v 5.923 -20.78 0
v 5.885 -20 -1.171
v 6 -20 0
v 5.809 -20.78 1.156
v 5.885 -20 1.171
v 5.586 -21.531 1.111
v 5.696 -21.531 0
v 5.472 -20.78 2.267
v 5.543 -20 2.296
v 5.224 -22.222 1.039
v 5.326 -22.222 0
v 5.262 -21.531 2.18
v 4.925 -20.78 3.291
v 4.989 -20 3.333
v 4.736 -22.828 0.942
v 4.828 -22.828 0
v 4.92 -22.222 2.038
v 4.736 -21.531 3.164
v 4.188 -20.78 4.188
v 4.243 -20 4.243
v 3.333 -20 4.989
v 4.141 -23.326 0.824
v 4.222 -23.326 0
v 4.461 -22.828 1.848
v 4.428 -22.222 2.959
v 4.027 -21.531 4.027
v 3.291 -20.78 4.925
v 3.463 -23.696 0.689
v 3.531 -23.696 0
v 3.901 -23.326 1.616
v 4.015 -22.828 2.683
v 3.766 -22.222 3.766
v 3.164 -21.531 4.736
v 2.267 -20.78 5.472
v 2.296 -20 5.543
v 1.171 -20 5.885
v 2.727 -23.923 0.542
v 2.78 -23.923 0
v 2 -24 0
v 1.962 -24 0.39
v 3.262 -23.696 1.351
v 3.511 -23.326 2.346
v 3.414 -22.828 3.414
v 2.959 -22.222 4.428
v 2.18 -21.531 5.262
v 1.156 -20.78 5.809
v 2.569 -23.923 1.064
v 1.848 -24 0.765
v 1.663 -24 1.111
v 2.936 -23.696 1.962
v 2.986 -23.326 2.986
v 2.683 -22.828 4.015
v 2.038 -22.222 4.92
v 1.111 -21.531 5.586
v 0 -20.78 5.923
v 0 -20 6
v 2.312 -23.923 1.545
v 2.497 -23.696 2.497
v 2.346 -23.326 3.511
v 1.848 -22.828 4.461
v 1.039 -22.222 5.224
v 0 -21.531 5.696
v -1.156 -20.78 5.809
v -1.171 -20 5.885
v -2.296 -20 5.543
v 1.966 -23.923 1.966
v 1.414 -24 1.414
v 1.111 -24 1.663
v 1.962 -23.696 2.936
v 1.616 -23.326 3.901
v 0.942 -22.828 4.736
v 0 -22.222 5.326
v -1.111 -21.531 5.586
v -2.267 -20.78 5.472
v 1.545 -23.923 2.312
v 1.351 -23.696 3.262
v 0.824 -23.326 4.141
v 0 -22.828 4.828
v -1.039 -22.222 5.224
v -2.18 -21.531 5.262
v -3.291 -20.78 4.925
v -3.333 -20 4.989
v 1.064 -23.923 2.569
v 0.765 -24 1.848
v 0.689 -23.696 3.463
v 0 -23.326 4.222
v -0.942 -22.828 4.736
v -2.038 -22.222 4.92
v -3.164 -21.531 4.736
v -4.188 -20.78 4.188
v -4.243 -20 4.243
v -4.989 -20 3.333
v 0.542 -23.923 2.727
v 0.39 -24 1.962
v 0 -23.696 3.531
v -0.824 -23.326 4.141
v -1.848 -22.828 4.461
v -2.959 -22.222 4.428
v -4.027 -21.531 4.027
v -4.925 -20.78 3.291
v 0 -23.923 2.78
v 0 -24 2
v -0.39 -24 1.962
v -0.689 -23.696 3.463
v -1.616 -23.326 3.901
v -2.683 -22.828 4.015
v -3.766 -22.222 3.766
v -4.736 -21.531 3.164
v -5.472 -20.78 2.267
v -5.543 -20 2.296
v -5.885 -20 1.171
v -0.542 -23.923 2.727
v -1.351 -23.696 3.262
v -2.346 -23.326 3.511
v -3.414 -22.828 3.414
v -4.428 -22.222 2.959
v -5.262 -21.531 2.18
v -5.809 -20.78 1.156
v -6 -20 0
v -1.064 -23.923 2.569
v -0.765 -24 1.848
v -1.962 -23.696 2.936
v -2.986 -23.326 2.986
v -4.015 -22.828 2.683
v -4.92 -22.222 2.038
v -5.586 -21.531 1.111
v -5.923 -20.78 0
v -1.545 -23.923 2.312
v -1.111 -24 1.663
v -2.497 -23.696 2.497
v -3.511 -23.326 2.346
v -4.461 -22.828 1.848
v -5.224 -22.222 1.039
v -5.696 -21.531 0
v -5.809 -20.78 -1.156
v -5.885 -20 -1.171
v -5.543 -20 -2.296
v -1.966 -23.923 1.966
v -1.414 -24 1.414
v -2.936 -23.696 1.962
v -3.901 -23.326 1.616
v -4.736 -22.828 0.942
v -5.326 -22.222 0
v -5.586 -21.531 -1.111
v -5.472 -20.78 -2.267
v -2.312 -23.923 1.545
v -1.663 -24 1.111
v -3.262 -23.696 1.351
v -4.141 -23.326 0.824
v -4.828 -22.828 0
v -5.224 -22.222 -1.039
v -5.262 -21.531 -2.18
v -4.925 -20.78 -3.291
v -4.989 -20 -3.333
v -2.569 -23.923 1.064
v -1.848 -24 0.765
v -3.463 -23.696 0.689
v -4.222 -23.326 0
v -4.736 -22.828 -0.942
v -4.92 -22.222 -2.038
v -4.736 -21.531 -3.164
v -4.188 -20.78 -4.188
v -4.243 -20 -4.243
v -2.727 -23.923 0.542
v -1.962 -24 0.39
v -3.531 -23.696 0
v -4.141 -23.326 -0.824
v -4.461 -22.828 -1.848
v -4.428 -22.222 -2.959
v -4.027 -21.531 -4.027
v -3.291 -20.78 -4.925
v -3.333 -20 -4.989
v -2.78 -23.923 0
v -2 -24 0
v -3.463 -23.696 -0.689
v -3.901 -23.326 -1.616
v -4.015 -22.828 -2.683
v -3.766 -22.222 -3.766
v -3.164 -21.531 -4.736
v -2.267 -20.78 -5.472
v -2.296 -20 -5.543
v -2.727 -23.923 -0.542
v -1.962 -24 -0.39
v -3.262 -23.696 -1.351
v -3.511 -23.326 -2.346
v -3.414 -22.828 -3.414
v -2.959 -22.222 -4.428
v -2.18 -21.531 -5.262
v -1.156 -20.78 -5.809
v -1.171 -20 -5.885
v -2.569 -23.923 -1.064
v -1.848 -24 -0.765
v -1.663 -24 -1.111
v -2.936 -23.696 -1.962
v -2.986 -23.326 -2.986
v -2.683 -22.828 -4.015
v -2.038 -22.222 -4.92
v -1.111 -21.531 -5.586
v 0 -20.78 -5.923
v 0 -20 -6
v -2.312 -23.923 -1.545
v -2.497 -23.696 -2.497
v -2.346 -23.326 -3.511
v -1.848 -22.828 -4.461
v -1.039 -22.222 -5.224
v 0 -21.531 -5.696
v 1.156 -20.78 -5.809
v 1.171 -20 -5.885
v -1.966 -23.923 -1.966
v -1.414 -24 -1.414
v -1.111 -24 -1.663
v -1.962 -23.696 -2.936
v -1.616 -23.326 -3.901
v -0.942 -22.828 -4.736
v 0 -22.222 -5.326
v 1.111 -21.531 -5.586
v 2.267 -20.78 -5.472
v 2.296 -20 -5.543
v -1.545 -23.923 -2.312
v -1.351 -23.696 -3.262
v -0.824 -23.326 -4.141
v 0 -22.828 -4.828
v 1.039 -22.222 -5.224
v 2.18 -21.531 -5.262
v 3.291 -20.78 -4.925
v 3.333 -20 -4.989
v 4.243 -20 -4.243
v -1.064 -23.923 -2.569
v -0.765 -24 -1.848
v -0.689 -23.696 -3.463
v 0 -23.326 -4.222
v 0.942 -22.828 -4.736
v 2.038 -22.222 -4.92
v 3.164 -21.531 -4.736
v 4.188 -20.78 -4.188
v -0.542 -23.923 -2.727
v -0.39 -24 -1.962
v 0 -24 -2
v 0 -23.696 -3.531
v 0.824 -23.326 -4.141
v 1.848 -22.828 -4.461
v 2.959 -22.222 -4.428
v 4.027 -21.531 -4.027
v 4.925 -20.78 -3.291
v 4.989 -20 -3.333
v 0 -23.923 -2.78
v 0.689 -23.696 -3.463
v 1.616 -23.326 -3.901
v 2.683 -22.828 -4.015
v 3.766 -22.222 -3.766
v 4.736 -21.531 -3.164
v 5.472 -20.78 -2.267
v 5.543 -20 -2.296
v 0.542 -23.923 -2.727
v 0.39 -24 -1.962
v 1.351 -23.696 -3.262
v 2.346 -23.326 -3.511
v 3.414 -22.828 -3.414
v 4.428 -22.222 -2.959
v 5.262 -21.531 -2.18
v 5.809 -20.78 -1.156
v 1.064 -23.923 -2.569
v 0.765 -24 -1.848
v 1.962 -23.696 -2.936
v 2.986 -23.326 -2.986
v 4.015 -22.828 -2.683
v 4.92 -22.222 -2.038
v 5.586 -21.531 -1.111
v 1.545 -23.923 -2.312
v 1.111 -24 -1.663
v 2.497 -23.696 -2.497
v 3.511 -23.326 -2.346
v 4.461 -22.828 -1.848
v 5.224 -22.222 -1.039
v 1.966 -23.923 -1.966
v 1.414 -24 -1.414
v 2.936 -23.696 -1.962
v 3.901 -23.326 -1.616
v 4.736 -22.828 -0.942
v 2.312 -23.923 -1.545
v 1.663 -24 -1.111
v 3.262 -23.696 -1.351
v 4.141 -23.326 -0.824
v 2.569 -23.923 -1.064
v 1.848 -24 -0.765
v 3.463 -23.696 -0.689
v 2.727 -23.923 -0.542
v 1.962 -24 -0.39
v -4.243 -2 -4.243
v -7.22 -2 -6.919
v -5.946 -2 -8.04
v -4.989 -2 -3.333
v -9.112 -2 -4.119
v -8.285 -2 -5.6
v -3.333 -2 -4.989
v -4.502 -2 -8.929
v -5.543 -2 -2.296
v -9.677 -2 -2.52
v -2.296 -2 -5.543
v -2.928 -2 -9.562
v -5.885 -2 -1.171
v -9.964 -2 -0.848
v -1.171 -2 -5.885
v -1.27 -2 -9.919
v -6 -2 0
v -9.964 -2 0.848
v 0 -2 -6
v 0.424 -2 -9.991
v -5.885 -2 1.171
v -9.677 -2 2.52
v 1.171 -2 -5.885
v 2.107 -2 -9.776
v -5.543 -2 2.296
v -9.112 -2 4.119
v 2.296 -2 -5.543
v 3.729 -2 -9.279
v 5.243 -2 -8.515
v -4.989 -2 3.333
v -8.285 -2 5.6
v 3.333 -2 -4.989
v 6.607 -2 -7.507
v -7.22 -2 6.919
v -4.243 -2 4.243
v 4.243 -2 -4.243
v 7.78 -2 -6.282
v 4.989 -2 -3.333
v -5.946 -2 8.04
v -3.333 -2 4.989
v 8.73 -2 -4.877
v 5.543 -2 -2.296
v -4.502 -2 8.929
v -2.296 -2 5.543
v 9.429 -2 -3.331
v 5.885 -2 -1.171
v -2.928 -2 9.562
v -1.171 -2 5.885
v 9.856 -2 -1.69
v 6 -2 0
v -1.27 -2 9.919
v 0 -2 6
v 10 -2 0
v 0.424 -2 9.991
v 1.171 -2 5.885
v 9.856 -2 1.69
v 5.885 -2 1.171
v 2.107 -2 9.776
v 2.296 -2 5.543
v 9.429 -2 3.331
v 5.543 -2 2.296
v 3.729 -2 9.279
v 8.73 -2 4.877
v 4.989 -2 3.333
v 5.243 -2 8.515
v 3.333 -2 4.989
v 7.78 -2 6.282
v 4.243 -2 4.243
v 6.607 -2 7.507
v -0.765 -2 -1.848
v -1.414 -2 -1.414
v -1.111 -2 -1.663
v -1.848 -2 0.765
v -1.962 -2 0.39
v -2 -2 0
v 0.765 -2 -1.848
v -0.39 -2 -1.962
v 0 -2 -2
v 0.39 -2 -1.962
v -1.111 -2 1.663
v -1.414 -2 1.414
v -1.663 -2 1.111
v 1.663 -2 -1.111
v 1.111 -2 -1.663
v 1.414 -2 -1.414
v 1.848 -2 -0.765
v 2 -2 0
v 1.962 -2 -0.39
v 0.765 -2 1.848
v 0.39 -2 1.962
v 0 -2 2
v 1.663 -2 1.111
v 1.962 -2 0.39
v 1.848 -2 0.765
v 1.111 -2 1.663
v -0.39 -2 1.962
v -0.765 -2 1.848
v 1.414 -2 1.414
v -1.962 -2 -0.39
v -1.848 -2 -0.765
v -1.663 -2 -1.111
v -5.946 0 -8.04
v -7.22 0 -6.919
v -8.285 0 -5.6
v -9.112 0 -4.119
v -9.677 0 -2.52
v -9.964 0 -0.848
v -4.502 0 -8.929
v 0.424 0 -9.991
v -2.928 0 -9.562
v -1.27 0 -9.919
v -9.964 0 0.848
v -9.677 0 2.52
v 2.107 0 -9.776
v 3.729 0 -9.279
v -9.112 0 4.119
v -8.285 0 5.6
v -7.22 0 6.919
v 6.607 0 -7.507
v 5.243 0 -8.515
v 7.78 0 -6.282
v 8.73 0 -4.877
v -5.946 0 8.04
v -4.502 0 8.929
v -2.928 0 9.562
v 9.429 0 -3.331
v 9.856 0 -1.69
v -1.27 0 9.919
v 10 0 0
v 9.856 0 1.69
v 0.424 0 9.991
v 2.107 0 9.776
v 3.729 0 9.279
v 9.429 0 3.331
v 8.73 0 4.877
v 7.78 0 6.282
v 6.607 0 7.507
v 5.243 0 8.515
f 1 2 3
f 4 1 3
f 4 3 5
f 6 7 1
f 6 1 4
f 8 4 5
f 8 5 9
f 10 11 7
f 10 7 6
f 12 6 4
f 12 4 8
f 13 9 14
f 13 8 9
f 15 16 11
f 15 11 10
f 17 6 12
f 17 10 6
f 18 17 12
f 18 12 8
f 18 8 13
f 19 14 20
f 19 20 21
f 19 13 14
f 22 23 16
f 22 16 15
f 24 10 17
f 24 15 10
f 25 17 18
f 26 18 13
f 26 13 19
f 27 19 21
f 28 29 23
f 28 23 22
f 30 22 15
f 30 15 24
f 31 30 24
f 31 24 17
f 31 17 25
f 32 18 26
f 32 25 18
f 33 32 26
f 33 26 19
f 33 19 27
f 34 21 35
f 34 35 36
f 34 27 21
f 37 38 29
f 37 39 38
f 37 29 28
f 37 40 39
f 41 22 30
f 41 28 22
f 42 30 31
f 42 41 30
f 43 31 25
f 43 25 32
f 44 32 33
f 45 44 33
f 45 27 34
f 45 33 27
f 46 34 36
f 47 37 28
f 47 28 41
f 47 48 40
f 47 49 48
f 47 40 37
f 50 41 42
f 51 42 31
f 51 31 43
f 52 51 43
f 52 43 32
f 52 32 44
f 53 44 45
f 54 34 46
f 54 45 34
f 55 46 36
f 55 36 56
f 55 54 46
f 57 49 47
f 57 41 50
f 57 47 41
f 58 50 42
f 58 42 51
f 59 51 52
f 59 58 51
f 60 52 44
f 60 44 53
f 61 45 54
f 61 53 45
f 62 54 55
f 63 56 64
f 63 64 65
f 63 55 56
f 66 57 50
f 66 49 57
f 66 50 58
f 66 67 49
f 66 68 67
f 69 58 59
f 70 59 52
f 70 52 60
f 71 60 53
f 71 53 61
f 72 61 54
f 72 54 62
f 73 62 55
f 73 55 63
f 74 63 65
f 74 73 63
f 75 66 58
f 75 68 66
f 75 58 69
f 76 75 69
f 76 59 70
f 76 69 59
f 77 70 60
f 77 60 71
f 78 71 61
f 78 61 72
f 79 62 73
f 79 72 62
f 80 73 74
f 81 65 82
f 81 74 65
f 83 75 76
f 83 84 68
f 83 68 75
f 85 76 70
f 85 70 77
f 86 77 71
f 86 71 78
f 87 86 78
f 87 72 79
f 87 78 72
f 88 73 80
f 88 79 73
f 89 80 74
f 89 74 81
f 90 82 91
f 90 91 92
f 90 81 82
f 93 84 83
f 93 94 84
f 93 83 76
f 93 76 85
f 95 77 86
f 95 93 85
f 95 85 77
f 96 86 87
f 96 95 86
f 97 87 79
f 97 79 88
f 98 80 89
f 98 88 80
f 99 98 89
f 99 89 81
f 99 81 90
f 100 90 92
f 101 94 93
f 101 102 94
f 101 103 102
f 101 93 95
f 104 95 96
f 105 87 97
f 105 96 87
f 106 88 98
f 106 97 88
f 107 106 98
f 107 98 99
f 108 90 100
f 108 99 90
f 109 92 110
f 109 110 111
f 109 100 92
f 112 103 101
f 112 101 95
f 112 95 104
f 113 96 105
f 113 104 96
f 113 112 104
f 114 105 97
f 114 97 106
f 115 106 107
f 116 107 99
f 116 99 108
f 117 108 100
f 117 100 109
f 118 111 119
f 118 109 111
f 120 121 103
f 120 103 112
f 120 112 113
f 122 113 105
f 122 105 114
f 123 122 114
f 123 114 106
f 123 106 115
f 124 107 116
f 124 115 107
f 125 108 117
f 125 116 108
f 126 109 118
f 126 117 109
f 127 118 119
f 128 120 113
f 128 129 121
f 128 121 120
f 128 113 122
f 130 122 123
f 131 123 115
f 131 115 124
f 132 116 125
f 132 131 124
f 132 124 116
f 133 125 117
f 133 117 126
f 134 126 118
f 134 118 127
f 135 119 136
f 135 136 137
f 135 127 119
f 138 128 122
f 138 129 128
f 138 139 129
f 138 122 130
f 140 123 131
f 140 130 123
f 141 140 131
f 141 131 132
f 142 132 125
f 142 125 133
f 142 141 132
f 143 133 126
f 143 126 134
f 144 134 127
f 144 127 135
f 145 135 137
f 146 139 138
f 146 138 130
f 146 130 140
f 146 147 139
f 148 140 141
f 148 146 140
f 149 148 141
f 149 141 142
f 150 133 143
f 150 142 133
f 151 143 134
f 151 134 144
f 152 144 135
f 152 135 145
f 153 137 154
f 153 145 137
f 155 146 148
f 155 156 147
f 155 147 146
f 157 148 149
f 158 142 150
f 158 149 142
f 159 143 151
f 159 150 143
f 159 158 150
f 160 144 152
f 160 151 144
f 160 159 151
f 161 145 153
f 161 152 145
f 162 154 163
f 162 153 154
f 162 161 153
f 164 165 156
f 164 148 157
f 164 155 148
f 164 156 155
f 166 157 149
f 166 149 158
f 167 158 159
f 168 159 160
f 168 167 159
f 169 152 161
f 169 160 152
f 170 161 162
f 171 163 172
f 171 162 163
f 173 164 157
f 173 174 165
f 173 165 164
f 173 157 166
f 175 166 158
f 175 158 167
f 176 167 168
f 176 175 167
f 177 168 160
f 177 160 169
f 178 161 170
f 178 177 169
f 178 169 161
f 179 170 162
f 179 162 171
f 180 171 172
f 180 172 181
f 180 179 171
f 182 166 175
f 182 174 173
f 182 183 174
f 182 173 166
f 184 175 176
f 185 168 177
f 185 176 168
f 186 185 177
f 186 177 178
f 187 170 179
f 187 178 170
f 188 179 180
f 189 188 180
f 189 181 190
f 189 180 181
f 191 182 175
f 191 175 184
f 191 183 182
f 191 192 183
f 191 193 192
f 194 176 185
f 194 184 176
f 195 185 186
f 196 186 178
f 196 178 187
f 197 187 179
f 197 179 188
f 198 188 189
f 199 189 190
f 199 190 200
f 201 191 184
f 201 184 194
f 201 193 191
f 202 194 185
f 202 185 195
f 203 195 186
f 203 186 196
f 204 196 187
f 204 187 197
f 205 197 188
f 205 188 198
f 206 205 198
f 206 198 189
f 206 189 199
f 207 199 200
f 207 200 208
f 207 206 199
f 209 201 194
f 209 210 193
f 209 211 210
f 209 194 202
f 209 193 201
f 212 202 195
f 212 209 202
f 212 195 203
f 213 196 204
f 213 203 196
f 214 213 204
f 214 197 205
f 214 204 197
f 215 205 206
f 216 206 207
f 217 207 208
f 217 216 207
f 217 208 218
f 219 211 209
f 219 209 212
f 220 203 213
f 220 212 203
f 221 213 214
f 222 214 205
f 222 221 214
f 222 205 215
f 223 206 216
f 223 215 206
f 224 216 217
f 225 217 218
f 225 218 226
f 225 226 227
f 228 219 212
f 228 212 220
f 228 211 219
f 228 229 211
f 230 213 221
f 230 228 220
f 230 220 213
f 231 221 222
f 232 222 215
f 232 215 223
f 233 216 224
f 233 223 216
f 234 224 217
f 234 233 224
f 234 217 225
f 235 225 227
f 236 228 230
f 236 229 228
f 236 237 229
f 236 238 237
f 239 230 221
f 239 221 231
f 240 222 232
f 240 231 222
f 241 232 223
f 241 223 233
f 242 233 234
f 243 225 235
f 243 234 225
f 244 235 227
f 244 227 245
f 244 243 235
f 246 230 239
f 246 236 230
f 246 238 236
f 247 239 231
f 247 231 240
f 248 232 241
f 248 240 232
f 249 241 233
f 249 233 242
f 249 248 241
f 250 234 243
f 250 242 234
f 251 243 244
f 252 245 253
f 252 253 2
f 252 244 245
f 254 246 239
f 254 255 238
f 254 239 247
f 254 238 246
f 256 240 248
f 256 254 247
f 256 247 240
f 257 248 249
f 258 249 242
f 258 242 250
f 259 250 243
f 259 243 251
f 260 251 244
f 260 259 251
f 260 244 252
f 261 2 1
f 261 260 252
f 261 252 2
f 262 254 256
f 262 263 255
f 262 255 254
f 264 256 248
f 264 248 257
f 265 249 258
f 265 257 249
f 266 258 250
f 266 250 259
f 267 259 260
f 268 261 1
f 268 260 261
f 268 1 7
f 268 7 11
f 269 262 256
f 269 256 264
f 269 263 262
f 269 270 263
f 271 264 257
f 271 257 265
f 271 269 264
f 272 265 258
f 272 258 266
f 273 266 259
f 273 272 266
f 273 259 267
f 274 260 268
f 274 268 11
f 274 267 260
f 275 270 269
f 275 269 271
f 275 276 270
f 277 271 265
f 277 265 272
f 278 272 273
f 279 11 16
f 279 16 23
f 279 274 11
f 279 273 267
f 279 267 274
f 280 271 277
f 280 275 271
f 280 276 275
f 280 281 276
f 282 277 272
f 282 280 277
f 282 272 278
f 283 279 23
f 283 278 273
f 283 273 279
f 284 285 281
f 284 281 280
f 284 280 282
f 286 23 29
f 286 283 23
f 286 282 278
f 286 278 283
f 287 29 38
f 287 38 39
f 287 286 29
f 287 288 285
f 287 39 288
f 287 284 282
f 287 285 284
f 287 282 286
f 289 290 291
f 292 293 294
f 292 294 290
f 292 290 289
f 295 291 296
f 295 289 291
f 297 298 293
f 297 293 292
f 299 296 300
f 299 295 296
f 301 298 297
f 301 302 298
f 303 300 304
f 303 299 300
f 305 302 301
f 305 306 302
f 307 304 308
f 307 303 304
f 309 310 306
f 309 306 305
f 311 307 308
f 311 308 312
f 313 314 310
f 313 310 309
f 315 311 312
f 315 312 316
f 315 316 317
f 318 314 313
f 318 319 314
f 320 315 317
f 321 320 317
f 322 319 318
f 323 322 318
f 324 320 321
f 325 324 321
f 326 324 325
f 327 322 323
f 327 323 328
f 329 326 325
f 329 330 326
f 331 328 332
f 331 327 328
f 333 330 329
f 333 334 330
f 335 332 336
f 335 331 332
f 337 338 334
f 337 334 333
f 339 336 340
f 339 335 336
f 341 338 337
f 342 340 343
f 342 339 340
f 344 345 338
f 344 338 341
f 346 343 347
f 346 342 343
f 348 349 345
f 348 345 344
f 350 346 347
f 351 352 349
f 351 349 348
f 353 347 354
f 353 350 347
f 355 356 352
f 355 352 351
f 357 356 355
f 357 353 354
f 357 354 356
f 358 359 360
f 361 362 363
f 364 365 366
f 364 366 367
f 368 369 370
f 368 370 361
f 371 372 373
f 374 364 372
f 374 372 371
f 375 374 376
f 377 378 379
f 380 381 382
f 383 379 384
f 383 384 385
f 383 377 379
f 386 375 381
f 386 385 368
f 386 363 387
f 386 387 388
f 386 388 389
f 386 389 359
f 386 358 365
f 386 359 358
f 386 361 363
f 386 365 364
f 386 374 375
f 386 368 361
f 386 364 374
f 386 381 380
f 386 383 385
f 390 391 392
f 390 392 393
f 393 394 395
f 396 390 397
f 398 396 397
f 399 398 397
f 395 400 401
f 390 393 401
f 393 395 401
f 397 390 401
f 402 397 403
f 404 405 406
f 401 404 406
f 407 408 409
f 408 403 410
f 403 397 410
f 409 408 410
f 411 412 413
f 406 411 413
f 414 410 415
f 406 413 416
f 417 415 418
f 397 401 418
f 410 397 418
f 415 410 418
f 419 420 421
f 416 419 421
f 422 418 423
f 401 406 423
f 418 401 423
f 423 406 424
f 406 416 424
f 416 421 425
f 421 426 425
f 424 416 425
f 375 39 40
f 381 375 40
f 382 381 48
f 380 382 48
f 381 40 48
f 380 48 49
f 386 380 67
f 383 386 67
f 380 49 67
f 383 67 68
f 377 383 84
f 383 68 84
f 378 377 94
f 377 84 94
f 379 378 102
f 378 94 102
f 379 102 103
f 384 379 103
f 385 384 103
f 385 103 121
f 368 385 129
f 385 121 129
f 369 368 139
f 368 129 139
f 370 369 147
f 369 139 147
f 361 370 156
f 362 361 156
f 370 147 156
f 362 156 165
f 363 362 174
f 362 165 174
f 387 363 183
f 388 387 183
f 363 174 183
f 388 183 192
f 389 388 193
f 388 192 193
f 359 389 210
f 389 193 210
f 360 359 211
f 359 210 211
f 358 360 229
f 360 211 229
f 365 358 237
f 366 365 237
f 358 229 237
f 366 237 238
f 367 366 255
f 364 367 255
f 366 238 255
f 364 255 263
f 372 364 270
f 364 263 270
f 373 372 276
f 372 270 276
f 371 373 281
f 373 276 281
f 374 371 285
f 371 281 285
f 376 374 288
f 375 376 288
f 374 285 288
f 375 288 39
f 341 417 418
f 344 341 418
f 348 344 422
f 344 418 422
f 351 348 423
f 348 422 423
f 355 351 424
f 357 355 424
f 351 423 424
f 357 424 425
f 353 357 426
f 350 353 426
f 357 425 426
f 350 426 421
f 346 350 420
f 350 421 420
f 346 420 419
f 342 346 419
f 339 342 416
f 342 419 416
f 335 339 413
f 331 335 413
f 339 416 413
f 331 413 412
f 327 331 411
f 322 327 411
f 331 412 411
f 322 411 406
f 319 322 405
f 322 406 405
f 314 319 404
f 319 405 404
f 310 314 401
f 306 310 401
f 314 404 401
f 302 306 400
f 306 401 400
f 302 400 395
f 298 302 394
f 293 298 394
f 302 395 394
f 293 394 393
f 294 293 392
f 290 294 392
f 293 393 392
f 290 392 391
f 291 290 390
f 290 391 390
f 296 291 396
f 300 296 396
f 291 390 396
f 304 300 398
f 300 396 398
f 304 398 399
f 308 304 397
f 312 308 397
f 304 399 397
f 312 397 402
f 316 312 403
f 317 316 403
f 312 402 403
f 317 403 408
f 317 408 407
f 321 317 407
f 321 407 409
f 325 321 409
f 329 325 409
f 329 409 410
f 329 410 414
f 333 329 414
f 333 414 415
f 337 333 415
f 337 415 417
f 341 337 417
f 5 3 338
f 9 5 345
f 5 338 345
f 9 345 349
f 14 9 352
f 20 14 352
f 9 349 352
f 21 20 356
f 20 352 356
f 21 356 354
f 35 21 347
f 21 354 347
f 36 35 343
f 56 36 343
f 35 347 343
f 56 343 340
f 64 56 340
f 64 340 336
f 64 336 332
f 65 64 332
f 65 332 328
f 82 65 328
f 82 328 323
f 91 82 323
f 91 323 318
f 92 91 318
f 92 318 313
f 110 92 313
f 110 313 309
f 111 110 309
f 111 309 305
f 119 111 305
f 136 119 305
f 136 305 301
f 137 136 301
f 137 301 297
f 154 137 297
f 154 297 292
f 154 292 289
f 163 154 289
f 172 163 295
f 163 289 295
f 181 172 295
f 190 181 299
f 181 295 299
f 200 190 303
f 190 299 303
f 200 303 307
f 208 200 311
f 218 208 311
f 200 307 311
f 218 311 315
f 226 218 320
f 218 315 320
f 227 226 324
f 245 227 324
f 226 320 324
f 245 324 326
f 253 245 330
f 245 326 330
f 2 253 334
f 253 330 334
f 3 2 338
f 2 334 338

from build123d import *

# Parameters (mm, degrees)
F0_R     = 6
F1_DEPTH = 24
F0_R_2   = 9.9999997765
F2_DEPTH = 2
F3_R     = 4
F4_DEPTH = 22


with BuildPart() as f1:
    # F0 (on Front) → F1 (new body)
    with BuildSketch(Plane.XZ):
        Circle(F0_R)
    extrude(amount=F1_DEPTH)

    # F0 (on Front) → F2 (join)
    with BuildSketch(Plane.XZ):
        Circle(F0_R_2)
        Circle(F0_R, mode=Mode.SUBTRACT)
    extrude(amount=F2_DEPTH)

    # F3
    f3_edges = [f1.edges().sort_by_distance(p)[0] for p in [
        (-6, -24, 0),
    ]]
    fillet(f3_edges, radius=F3_R)

    # F4 (cut): a face of the model
    f4_faces = [f1.faces().sort_by_distance(p)[0] for p in [
        (0, -24, 0),
    ]]
    extrude(f4_faces, amount=-F4_DEPTH, mode=Mode.SUBTRACT)


solid = f1.part
